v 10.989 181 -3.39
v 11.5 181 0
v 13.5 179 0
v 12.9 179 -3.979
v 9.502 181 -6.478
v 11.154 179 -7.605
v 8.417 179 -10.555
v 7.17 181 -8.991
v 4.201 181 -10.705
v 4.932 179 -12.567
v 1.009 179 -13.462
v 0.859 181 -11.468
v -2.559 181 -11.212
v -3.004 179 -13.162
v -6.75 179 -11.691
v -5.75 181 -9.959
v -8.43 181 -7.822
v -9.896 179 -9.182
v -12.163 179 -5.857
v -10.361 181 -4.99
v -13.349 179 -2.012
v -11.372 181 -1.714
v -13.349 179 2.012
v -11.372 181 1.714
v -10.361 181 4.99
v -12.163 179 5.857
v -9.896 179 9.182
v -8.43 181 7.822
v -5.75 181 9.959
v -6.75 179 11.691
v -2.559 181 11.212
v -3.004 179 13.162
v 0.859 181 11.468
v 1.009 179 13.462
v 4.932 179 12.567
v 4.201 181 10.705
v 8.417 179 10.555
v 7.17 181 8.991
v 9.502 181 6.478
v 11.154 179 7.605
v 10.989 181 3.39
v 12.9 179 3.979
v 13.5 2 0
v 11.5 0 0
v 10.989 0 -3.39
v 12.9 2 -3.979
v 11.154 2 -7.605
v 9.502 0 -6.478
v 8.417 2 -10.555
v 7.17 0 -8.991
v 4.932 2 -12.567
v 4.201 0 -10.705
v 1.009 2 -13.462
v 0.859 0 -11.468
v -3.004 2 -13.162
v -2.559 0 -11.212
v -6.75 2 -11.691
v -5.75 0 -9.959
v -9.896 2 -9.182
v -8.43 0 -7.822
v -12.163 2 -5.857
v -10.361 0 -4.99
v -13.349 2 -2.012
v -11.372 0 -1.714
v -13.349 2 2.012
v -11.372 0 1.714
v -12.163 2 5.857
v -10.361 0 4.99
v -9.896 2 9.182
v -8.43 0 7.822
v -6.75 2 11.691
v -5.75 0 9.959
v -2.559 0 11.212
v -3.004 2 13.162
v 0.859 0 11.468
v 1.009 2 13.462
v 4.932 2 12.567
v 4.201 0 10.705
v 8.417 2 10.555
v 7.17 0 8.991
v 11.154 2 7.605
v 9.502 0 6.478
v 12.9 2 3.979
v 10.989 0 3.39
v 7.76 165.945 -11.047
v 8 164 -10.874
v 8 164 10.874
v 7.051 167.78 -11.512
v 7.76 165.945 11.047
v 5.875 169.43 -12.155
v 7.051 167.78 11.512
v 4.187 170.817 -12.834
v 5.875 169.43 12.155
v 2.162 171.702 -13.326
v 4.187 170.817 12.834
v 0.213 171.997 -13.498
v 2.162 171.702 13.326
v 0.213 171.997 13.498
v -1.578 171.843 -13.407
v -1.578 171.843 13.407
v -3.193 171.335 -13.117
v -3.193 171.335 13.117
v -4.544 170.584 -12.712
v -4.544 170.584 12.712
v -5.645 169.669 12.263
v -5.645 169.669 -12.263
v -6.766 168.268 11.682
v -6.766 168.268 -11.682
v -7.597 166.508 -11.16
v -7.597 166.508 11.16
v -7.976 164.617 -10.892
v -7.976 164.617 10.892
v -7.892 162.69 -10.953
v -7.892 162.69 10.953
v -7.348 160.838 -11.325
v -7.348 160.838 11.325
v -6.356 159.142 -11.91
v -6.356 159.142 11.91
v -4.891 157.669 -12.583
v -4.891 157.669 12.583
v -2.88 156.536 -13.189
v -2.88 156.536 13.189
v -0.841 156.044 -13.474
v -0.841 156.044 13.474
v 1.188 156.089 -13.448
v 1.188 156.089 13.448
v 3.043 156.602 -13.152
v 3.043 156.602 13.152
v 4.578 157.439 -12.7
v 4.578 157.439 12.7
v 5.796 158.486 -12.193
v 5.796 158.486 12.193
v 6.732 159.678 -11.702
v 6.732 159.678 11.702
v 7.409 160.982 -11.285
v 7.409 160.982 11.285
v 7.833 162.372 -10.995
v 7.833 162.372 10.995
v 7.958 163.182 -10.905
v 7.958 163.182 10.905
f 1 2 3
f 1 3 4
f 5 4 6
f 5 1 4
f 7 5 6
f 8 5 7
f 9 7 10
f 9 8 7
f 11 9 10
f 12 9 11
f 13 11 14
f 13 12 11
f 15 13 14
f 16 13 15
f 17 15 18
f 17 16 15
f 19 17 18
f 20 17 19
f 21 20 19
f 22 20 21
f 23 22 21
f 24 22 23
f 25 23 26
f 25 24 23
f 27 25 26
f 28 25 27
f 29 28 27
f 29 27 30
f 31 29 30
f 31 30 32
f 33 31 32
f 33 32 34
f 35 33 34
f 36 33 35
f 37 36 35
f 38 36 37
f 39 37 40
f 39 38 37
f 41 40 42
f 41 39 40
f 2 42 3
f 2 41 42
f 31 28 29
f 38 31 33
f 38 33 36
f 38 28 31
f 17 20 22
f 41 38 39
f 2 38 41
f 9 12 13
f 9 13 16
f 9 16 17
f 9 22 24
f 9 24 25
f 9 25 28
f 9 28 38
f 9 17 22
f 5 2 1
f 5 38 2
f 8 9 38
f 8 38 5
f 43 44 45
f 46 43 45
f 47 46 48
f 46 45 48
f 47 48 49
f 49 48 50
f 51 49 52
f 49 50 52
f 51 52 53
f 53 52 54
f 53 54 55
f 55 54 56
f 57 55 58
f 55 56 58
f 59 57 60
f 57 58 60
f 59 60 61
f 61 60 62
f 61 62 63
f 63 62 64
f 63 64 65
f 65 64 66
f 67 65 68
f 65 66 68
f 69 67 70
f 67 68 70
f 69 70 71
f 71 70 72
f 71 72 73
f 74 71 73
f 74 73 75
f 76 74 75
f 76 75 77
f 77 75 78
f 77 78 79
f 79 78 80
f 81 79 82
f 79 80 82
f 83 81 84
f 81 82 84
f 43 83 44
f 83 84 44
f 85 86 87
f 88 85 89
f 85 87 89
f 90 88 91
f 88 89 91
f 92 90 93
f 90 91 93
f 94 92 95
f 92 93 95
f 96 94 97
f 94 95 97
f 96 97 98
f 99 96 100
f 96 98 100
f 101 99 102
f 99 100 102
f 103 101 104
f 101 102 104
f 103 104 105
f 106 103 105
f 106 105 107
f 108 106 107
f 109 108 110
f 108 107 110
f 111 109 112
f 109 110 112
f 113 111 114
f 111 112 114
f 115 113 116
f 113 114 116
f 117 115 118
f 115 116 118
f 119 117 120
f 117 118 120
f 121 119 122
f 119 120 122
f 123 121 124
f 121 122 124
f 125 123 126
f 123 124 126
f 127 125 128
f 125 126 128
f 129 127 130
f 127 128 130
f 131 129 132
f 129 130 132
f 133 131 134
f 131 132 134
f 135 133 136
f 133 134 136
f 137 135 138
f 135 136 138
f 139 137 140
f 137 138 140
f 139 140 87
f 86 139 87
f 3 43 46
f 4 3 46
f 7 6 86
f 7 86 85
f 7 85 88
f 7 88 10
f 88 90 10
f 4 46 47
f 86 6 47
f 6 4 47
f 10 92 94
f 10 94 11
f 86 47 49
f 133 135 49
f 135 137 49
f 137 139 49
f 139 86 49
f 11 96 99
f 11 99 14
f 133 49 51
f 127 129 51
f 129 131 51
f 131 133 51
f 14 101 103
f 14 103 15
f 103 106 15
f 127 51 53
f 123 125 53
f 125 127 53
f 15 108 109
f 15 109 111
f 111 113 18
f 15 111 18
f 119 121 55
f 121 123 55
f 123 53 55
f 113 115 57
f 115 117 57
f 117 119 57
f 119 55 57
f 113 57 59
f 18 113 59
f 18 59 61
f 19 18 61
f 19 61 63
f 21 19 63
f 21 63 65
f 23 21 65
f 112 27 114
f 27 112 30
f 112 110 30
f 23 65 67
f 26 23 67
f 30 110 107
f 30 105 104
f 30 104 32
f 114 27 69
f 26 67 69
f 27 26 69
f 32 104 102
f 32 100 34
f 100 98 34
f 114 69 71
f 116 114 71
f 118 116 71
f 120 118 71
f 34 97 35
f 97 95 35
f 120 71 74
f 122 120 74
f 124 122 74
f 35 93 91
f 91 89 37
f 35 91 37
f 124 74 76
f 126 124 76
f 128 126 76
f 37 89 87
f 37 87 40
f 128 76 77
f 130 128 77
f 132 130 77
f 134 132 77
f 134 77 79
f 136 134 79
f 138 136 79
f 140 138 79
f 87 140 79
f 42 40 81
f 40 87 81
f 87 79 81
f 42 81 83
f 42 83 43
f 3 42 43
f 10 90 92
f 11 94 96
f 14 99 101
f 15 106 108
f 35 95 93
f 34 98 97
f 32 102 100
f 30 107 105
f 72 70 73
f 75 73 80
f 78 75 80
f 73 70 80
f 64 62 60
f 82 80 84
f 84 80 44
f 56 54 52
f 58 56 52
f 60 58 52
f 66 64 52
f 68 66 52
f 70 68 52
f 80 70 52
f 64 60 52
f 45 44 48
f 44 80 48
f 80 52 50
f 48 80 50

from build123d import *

# Parameters (mm, degrees)
SKETCH1_R               = 13.5
BOSS_EXTRUDE1_DEPTH     = 181
SKETCH2_R               = 8
CUT_EXTRUDE1_DEPTH      = 14.5
CUT_EXTRUDE1_DEPTH_BACK = 14.5
CHAMFER1_SIZE           = 2


with BuildPart() as part:
    # Sketch1 → Boss-Extrude1 (new body)
    with BuildSketch(Plane(origin=(0, 0, 0), x_dir=(1, 0, 0), z_dir=(0, 1, 0))):
        Circle(SKETCH1_R)
    extrude(amount=BOSS_EXTRUDE1_DEPTH)

    # Sketch2 → Cut-Extrude1 (cut, two sides)
    with BuildSketch(Plane.XY) as cut_extrude1_sk:
        with Locations((0, 164)):
            Circle(SKETCH2_R)
    extrude(amount=CUT_EXTRUDE1_DEPTH, mode=Mode.SUBTRACT)
    extrude(cut_extrude1_sk.sketch, amount=-CUT_EXTRUDE1_DEPTH_BACK, mode=Mode.SUBTRACT)

    # Chamfer1
    chamfer1_edges = [part.edges().sort_by_distance(p)[0] for p in [
        (-13.5, 0, 0),
        (-13.5, 181, 0),
    ]]
    chamfer(chamfer1_edges, length=CHAMFER1_SIZE)


solid = part.part
